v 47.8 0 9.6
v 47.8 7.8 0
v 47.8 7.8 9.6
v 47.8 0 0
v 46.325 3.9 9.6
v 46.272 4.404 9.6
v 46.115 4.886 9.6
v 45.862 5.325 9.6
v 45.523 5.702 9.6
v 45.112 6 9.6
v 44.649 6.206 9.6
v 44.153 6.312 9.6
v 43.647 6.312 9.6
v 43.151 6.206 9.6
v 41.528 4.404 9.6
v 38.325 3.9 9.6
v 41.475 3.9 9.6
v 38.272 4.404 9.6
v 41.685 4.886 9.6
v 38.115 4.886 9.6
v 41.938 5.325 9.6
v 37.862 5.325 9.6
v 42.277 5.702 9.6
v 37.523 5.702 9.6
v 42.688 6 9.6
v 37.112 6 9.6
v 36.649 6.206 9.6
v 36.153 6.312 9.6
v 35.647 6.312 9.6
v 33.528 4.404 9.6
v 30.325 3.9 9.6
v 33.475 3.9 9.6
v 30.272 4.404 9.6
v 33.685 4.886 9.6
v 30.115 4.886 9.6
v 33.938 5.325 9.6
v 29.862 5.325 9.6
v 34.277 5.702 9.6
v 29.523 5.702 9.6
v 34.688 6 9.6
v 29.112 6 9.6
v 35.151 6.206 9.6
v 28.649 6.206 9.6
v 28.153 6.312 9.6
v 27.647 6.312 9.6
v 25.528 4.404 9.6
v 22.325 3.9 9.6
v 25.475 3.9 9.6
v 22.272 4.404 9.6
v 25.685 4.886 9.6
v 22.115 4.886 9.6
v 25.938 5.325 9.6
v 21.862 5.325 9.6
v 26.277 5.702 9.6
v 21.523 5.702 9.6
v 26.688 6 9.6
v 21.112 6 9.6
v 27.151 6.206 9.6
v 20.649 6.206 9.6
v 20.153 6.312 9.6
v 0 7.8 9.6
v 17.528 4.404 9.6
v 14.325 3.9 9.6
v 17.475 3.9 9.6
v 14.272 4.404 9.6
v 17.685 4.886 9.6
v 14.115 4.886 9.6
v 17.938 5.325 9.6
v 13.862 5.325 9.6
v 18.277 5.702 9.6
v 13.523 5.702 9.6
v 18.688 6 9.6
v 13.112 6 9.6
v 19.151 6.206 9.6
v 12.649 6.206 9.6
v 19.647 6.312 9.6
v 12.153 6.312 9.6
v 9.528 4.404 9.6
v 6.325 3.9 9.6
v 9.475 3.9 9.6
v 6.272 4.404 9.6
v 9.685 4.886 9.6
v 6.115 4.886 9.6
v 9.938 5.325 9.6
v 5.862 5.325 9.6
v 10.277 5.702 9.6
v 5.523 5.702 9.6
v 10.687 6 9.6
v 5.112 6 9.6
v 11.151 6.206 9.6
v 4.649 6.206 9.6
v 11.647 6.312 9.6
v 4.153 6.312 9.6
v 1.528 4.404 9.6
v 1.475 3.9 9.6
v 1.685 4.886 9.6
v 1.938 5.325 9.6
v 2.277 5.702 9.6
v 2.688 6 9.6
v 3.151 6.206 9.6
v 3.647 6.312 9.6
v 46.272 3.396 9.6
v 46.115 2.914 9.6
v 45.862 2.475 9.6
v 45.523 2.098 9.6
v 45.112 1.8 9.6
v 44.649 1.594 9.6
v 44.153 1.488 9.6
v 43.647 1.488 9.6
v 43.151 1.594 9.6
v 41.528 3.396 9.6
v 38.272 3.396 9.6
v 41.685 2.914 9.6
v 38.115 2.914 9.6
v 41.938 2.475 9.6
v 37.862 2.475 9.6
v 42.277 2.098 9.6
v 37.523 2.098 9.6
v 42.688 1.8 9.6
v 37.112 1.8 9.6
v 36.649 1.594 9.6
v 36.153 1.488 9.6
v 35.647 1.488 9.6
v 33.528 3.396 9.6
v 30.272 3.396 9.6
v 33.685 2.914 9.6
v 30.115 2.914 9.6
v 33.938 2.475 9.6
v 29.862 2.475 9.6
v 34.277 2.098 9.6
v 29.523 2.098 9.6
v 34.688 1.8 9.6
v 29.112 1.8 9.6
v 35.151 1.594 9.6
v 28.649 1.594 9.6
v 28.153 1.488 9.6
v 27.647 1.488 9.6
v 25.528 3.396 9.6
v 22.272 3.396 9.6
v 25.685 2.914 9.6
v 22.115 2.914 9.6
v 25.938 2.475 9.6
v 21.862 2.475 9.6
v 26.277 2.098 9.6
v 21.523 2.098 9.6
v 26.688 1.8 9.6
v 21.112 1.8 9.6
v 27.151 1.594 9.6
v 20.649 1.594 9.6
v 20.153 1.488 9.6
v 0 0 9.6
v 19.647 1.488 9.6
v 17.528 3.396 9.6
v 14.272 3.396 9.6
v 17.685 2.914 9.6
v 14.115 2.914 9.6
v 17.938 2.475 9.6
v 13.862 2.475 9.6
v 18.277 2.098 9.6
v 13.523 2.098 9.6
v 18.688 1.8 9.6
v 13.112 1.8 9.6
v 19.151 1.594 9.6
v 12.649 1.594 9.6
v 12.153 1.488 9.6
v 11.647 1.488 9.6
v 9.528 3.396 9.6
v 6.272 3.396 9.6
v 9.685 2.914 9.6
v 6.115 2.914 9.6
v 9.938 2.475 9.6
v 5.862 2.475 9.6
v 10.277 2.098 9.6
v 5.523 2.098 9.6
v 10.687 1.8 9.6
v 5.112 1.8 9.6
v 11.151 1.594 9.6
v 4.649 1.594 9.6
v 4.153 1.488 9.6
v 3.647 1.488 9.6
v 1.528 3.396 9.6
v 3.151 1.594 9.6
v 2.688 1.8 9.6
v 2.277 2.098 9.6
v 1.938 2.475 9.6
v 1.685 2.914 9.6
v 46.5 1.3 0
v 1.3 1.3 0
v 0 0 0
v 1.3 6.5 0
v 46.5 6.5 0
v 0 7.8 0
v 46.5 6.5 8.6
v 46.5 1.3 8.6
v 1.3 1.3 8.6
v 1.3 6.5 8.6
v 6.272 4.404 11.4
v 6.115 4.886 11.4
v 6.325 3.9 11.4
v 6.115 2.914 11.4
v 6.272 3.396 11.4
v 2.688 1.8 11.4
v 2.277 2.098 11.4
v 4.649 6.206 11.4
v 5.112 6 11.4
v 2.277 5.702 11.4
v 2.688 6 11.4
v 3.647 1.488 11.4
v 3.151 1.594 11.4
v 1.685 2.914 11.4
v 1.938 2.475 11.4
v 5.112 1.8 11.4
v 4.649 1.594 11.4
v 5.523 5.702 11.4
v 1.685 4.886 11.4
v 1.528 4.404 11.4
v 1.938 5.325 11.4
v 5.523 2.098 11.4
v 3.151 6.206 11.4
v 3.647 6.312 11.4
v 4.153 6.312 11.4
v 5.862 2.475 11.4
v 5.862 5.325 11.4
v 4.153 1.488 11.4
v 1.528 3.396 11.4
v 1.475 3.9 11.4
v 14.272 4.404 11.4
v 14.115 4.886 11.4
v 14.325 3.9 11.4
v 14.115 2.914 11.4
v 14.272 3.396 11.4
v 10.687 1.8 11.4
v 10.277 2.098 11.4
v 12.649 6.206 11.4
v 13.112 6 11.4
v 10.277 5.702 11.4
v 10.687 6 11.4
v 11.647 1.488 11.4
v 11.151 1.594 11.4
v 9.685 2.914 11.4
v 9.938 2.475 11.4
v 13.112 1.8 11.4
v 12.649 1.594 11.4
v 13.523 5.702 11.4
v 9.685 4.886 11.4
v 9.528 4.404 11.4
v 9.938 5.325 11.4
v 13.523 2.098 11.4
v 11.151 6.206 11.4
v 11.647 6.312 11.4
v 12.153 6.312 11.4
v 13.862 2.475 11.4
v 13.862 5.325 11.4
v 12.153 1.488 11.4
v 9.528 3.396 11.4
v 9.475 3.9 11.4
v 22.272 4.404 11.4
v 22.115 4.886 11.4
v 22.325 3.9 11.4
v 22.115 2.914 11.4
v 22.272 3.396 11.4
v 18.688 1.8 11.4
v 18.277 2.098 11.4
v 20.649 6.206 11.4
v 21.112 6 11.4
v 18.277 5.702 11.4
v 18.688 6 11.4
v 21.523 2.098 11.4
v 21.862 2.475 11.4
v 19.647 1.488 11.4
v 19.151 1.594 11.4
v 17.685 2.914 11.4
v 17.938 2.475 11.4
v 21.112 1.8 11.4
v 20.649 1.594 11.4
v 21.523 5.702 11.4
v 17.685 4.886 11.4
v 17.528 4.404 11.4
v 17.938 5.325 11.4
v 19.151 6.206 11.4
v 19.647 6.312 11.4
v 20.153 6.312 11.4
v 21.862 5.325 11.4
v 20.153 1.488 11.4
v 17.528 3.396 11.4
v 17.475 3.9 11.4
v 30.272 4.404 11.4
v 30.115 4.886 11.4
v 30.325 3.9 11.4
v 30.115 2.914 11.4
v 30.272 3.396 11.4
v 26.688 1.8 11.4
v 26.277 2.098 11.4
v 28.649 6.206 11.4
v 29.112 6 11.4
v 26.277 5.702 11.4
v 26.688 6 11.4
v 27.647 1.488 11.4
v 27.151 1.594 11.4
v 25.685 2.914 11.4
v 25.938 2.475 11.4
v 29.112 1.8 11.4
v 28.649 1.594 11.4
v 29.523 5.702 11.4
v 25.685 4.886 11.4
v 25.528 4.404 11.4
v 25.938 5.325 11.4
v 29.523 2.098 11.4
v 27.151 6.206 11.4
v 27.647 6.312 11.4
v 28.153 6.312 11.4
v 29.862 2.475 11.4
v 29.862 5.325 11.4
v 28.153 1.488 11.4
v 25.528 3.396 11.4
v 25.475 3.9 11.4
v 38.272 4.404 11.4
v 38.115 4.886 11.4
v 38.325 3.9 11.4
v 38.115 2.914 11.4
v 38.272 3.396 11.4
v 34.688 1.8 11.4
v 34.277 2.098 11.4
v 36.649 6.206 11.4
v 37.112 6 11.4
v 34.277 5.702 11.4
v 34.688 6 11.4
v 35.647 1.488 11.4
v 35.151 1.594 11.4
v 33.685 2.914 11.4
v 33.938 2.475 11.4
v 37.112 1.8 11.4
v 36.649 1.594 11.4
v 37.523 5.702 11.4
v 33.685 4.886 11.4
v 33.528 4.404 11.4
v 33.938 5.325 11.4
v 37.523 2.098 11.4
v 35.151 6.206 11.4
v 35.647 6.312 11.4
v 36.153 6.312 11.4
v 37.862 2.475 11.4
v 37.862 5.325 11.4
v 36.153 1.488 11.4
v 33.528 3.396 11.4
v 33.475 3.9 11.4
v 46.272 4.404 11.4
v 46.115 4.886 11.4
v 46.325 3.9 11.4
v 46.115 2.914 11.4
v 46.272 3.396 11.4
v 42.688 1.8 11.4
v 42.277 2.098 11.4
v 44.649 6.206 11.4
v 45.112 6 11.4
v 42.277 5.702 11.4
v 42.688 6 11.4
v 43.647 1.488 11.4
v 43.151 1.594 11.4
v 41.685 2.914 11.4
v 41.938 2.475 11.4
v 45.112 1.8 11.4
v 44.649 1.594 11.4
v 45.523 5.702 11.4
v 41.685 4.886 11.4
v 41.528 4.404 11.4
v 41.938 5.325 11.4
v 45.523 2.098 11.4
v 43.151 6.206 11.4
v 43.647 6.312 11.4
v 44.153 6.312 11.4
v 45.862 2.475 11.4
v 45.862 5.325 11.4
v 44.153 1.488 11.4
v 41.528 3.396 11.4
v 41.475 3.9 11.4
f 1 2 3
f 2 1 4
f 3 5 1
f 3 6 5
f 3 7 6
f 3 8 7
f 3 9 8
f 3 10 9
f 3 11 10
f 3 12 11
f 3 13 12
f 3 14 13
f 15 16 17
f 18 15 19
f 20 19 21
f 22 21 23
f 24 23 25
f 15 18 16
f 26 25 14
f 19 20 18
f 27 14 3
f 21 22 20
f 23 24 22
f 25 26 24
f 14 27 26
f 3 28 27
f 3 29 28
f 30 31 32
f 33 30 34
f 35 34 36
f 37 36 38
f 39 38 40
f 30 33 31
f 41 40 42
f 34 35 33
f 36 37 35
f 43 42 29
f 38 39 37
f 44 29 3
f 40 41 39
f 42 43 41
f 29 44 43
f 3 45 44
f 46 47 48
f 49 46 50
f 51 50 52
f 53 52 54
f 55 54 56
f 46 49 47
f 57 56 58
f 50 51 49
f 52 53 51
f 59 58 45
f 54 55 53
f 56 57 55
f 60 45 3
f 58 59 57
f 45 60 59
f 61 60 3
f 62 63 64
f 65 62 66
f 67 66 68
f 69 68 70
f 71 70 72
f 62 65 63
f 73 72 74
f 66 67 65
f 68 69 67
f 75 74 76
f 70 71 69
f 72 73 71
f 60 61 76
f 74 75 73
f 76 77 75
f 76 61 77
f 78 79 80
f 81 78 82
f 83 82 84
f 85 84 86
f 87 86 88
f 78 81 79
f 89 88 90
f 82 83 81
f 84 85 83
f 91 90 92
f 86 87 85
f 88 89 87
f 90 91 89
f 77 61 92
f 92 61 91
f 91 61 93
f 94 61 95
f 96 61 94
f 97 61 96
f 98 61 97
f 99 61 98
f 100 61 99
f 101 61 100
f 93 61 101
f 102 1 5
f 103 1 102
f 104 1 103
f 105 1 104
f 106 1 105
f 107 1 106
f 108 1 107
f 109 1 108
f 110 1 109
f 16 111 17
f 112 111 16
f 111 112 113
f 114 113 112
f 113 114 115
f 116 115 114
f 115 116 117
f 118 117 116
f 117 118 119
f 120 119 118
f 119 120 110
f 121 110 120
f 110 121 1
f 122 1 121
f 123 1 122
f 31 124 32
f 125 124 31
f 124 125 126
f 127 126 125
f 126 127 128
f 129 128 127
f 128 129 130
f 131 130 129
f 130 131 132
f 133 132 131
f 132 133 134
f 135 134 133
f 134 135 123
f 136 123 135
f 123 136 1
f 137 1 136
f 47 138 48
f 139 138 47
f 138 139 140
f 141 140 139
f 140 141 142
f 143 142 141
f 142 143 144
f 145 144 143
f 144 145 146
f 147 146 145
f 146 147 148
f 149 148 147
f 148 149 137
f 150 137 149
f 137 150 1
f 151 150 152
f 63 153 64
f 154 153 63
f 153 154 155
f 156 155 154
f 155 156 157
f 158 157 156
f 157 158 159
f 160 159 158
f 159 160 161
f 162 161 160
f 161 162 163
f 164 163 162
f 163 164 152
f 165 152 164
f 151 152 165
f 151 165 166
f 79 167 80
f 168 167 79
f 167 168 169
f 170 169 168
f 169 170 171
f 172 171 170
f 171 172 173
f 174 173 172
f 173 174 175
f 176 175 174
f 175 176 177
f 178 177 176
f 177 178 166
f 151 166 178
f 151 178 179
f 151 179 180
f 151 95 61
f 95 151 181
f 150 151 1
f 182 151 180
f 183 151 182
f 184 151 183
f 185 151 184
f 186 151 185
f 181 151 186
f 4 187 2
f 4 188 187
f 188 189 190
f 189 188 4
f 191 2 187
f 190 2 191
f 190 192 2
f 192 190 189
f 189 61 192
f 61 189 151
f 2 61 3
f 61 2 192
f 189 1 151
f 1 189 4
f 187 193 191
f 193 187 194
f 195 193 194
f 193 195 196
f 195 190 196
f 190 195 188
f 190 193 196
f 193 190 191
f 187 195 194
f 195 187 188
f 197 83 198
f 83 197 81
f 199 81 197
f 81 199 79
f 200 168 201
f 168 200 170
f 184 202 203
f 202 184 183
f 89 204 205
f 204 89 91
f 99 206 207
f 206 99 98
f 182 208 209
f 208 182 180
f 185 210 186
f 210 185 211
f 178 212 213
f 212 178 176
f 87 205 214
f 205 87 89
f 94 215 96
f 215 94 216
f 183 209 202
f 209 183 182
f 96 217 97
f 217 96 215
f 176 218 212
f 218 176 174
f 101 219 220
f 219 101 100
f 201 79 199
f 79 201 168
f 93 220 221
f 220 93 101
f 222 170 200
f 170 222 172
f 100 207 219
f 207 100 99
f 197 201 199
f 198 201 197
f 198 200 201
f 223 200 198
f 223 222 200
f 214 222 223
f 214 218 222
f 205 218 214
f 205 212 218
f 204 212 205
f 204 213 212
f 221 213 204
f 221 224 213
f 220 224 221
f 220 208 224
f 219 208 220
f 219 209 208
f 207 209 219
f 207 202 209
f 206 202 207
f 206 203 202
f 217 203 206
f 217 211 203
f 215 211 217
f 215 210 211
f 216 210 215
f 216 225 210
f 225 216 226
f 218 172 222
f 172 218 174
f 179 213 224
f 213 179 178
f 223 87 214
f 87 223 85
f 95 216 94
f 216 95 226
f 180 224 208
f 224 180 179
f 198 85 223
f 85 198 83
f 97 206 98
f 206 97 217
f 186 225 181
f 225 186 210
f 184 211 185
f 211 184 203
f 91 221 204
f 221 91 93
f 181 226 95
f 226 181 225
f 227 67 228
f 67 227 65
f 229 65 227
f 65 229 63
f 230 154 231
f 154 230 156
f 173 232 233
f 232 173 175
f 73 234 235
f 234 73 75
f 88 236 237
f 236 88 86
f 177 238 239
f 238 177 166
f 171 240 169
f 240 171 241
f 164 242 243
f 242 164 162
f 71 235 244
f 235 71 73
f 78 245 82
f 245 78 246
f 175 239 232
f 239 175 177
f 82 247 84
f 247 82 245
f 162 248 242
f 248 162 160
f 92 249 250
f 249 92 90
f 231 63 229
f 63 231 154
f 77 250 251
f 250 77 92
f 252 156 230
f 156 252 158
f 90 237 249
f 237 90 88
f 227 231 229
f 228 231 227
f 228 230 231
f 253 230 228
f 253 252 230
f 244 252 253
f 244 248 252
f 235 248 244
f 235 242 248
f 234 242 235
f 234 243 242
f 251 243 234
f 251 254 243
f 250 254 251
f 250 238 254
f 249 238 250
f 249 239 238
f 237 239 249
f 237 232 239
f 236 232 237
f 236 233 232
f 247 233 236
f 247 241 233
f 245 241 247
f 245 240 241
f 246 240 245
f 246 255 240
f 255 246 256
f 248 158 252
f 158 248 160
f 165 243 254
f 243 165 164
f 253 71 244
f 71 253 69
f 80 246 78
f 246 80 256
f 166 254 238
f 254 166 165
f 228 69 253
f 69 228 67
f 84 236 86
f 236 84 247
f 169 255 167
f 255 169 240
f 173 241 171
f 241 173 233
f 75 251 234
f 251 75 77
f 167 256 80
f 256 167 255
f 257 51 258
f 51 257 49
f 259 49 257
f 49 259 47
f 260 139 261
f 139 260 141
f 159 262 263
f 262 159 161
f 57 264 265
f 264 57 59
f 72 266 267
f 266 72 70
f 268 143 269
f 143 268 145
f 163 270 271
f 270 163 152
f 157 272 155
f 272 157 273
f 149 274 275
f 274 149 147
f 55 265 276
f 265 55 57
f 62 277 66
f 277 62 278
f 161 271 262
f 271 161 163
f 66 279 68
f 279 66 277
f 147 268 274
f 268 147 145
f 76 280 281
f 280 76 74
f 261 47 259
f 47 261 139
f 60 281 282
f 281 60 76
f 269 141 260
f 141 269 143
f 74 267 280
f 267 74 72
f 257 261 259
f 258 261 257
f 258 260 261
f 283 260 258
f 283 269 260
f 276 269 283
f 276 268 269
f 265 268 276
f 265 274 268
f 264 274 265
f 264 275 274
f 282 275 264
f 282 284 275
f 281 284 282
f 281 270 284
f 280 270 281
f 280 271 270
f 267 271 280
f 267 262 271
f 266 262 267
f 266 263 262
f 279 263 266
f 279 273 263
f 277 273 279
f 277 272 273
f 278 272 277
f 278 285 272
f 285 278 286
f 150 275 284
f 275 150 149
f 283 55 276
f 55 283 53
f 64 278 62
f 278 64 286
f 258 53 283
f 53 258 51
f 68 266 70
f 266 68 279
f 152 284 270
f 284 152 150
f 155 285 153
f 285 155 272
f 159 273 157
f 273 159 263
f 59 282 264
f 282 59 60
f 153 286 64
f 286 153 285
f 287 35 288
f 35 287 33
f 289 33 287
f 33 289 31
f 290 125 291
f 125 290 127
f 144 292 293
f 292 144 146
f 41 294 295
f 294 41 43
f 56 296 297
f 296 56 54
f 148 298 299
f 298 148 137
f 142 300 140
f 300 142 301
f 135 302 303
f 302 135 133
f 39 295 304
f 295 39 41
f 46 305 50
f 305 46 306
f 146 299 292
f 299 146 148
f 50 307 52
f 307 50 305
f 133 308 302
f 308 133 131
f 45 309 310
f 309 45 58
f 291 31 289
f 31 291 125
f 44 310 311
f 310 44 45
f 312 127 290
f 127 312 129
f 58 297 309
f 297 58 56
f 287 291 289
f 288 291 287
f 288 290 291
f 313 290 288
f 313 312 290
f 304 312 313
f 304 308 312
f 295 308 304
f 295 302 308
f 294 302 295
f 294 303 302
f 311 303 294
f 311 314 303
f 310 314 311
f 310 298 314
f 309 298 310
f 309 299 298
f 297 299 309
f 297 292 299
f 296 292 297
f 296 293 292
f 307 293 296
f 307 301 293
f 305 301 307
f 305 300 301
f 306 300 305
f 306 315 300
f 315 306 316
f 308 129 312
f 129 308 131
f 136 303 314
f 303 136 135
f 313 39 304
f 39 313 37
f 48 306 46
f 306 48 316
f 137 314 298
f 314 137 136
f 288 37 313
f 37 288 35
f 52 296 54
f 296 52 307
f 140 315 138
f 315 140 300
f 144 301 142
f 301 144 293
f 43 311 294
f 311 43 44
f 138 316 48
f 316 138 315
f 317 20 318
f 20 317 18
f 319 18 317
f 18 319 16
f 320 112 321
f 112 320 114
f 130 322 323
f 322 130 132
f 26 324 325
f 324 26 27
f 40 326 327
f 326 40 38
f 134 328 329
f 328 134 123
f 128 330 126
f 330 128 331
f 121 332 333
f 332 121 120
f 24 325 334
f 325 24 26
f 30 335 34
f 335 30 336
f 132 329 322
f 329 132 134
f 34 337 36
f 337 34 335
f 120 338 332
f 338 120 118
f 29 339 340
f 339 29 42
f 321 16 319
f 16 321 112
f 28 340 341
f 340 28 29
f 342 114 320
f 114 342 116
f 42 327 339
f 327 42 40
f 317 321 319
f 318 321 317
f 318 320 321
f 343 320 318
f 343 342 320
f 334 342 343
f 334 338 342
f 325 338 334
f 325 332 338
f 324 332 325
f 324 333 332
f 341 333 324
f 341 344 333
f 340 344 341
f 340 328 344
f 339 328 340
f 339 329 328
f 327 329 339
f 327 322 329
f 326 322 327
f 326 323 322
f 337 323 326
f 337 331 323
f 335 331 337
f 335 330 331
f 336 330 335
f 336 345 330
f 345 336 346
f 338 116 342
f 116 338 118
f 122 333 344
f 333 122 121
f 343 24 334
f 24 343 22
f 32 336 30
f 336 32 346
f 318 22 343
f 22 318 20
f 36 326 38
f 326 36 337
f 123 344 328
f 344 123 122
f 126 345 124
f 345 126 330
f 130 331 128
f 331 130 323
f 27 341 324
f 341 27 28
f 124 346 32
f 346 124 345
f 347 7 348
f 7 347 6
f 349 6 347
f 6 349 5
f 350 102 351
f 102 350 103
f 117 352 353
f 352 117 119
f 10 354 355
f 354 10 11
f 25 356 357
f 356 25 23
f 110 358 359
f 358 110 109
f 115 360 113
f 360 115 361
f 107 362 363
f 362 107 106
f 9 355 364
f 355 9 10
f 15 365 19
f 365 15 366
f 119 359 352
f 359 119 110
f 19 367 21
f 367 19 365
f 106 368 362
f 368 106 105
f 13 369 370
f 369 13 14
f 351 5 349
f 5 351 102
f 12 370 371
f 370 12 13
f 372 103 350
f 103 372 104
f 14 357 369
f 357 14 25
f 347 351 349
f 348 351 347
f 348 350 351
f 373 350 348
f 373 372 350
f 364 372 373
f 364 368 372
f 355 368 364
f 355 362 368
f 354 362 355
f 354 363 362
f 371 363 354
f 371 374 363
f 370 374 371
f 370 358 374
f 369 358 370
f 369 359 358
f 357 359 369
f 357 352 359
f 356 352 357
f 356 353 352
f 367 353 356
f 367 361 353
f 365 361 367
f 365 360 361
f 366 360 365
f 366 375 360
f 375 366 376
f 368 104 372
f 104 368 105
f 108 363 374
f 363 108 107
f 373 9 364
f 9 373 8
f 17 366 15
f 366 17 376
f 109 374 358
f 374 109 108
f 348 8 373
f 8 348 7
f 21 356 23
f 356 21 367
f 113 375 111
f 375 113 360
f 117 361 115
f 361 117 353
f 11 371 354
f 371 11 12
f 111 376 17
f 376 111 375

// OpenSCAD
/**
 * Derived from http://www.thingiverse.com/thing:5699
 *
 * LEGO®, the LEGO® logo, the Brick, DUPLO®, and MINDSTORMS® are trademarks of the LEGO® Group. ©2012 The LEGO® Group.
 */
 
 /**
  * For clip and block, i've :
  * remove Pin diameter (pin_diameter = 0)
  * spline_thickness (spline_thickness=0)
  */

/* [General] */

// Width of the block, in studs
block_width = 1;

// Length of the block, in studs
block_length = 6;

// Height of the block. A ratio of "1" is a standard LEGO brick height; a ratio of "1/3" is a standard LEGO plate height; "1/2" is a standard DUPLO plate.
block_height_ratio = 1; // [.33333333333:1/3, .5:1/2, 1:1, 2:2, 3:3, 4:4, 5:5, 6:6, 7:7, 8:8, 9:9, 10:10]

// What type of block should this be? For type-specific options, see the "Wings," "Slopes," "Curves", and "Baseplates" tabs.
block_type = "brick"; // [brick:Brick, tile:Tile, wing:Wing, slope:Slope, curve:Curve, baseplate:Baseplate]

// What brand of block should this be? LEGO for regular LEGO bricks, Duplo for the toddler-focused larger bricks.
block_brand = "lego"; // [lego:LEGO, duplo:DUPLO]

// What stud type do you want? Hollow studs allow rods to be pushed into the stud.
stud_type = "solid"; // [solid:Solid, hollow:Hollow]

// Should the block include round horizontal holes like the Technics LEGO bricks have?
technic_holes = "no"; // [no:No, yes:Yes]

// Should the block include vertical cross-shaped axle holes?
vertical_axle_holes = "no"; // [no:No, yes:Yes]

/* [Wings] */

// What type of wing? Full is suitable for the front of a plane, left/right are for the left/right of a plane.
wing_type = "full"; // [full:Full, left:Left, right:Right]

// The number of studs across the end of the wing. If block_width is odd, this needs to be odd, and the same for even.
wing_end_width = 2;

// The length of the rectangular portion of the wing, in studs.
wing_base_length = 3;

// Should the wing edges be notched to accept studs below?
wing_stud_notches = "yes"; // [yes:Yes, no:No]

/* [Slopes] */

// How many rows of studs should be left before the slope?
slope_stud_rows = 1;

// How much vertical height should be left at the end of the slope? e.g, a value of zero means the slope reaches the bottom of the block. A value of 1 means that for a block with height 2, the slope reaches halfway down the block.
slope_end_height = 0;

/* [Curves] */

// How many rows of studs should be left before the curve?
curve_stud_rows = 5;

// Should the curve be convex or concave?
curve_type = "concave"; // [concave:Concave, convex:Convex]

// How much vertical height should be left at the end of the curve? e.g, a value of zero means the curve reaches the bottom of the block. A value of 1 means that for a block with height 2, the curve reaches halfway down the block.
curve_end_height = 0;

/* [Baseplates] */

// If you want a roadway, how wide should it be (in studs)? A roadway is a smooth (non-studded) section of a baseplate.
roadway_width = 0;

// How long should the roadway be?
roadway_length = 0;

// Where should the roadway start (x-value)? A value of zero puts the roadway at the far left side of the plate.
roadway_x = 0;

// Where should the roadway start (y-value)? A value of zero puts the roadway at the front of the plate.
roadway_y = 0;

/* [SNOT] */

// SNOT means Studs Not On Top -- bricks with alternative stud configurations.
// Put studs on the top and buttom?
dual_sided = "no"; // [no:No, yes:Yes]

// Instead of both sides having studs, both sides can have no studs.
dual_bottom = "no"; // [no:No, yes:Yes]

/* [Printer-Specific] */

// Should extra reinforcement be included to make printing on an FDM printer easier? Ignored for tiles, since they're printed upside-down and don't need the reinforcement. Recommended for block heights less than 1 or for Duplo bricks. 
use_reinforcement = "no"; // [no:No, yes:Yes]

// If your printer prints the blocks correctly except for the stud diameter, use this variable to resize just the studs for your printer. A value of 1.05 will print the studs 105% wider than standard.
stud_rescale = 1;
//stud_rescale = 1.0475 * 1; // Orion Delta, T-Glase
//stud_rescale = 1.022 * 1; // Orion Delta, ABS

// Print tiles upside down.
translate([0, 0, (block_type == "tile" ? block_height_ratio * block_height : 0)]) rotate([0, (block_type == "tile" ? 180 : 0), 0]) {
    block(
        width=block_width,
        length=block_length,
        height=block_height_ratio,
        type=block_type,
        brand=block_brand,
        stud_type=stud_type,
        horizontal_holes=(technic_holes=="yes"),
        vertical_axle_holes=(vertical_axle_holes=="yes"),
        reinforcement=(use_reinforcement=="yes"),
        wing_type=wing_type,
        wing_end_width=wing_end_width,
        wing_base_length=wing_base_length,
        stud_notches=(wing_stud_notches=="yes"),
        slope_stud_rows=slope_stud_rows,
        slope_end_height=slope_end_height,
        curve_stud_rows=curve_stud_rows,
        curve_type=curve_type,
        curve_end_height=curve_end_height,
        roadway_width=roadway_width,
        roadway_length=roadway_length,
        roadway_x=roadway_x,
        roadway_y=roadway_y,
        stud_rescale=stud_rescale,
        dual_sided=(dual_sided=="yes"),
        dual_bottom=(dual_bottom=="yes")
    );
}

module block(
    width=1,
    length=2,
    height=1,
    type="brick",
    brand="lego",
    stud_type="solid",
    horizontal_holes=false,
    vertical_axle_holes=false,
    reinforcement=false,
    wing_type="full",
    wing_end_width=2,
    wing_base_length=2,
    stud_notches=false,
    slope_stud_rows=1,
    slope_end_height=0,
    curve_stud_rows=1,
    curve_type="concave",
    curve_end_height=0,
    roadway_width=0,
    roadway_length=0,
    roadway_x=0,
    roadway_y=0,
    stud_rescale=1,
    dual_sided=false,
    dual_bottom=false
    ) {
    post_wall_thickness = (brand == "lego" ? 0.85 : 1);
    wall_thickness=(brand == "lego" ? 1.3 : 1.5);
    stud_diameter=(brand == "lego" ? 4.85 : 9.35);
    hollow_stud_inner_diameter = (brand == "lego" ? 3.1 : 6.7);
    stud_height=(brand == "lego" ? 1.8 : 4.4);
    stud_spacing=(brand == "lego" ? 8 : 8 * 2);
    block_height=(brand == "lego" ? (type == "baseplate" ? 1.3 : 9.6) : 9.6 * 2);
    pin_diameter=(brand == "lego" ? 0 : 3 * 2);
    post_diameter=(brand == "lego" ? 5.5 : 13.2);
    cylinder_precision=(brand == "lego" ? 0.1 : 0.05);
    reinforcing_width = (brand == "lego" ? 0.7 : 1);

    spline_length = (brand == "lego" ? 0.25 : 1.7);
    spline_thickness = (brand == "lego" ? 0 : 1.3);

    horizontal_hole_diameter = (brand == "lego" ? 4.8 : 4.8 * 2);
    horizontal_hole_z_offset = (brand == "lego" ? 5.8 : 5.8 * 2);
    horizontal_hole_bevel_diameter = (brand == "lego" ? 6.2 : 6.2 * 2);
    horizontal_hole_bevel_depth = (brand == "lego" ? 0.9 : 0.9 * 1.5 / 1.2 );

    roof_thickness = (type == "baseplate" || dual_sided ? block_height * height : 1 * 1);

    // Brand-independent measurements.
    axle_spline_width = 2.0;
    axle_diameter = 5 * 1;
    wall_play = 0.1 * 1;
    horizontal_hole_wall_thickness = 1 * 1;

    // Ensure that width is always less than or equal to length.
    real_width = (type == "wing" ? width : min(width, length) );
    real_length = (type == "wing" ? length : max(width, length) );
    real_height = max((type == "baseplate" ? 1 : 1/3), height);

    // Ensure that the wing end width is even if the width is even, odd if odd, and a reasonable value.
    real_wing_end_width = (wing_type == "full"
        ?
        min(real_width - 2, ((real_width % 2 == 0) ? 
            (max(2, (
                wing_end_width % 2 == 0 ?
                (wing_end_width)
                :
                (wing_end_width-1)
            )))
            :
            (max(1, (
                wing_end_width % 2 == 0 ?
                (wing_end_width-1)
                :
                (wing_end_width)
            )))
        ))
        :
        (min(real_width-1, max(1, wing_end_width))) // Half-wing
    );

    // Ensure that the base length is a reasonable value.
    real_wing_base_length = min(real_length-1, max(1, wing_base_length)) + 1; // +1 because the angle starts before the last stud.
        
    // Validate all the rest of the arguments.
    real_slope_end_height = max(0, min(real_height - 1/3, slope_end_height));
    real_slope_stud_rows = min(real_length - 1, slope_stud_rows);
    real_curve_stud_rows = max(0, curve_stud_rows);
    real_curve_type = (curve_type == "convex" ? "convex" : "concave");
    real_curve_end_height = max(0, min(real_height - 1/3, curve_end_height));
    real_horizontal_holes = horizontal_holes && ((type == "baseplate" && real_height >= 8) || real_height >= 1) && !dual_sided;
    real_vertical_axle_holes = vertical_axle_holes && real_width > 1;
    real_reinforcement = reinforcement && type != "baseplate" && type != "tile" && !dual_sided;

    real_roadway_width = max(0, min(roadway_width, real_width));
    real_roadway_length = max(0, min(roadway_length, real_length));
    real_roadway_x = max(0, min(real_length - real_roadway_length, roadway_x));
    real_roadway_y = max(0, min(real_width - real_roadway_width, roadway_y));

    real_stud_notches = stud_notches && !dual_sided;
    real_dual_sided = dual_sided && type != "curve" && type != "slope" && type != "tile";
    real_dual_bottom = dual_bottom && !real_dual_sided && type != "curve" && type != "slope";

    total_studs_width = (stud_diameter * stud_rescale * real_width) + ((real_width - 1) * (stud_spacing - (stud_diameter * stud_rescale)));
    total_studs_length = (stud_diameter * stud_rescale * real_length) + ((real_length - 1) * (stud_spacing - (stud_diameter * stud_rescale)));

    total_posts_width = (post_diameter * (real_width - 1)) + ((real_width - 2) * (stud_spacing - post_diameter));
    total_posts_length = (post_diameter * (real_length - 1)) + ((real_length - 2) * (stud_spacing - post_diameter));

    total_axles_width = (axle_diameter * (real_width - 1)) + ((real_width - 2) * (stud_spacing - axle_diameter));
    total_axles_length = (axle_diameter * (real_length - 1)) + ((real_length - 2) * (stud_spacing - axle_diameter));

    total_pins_width = (pin_diameter * (real_width - 1)) + max(0, ((real_width - 2) * (stud_spacing - pin_diameter)));
    total_pins_length = (pin_diameter * (real_length - 1)) + max(0, ((real_length - 2) * (stud_spacing - pin_diameter)));

    overall_length = (real_length * stud_spacing) - (2 * wall_play);
    overall_width = (real_width * stud_spacing) - (2 * wall_play);

    wing_slope = (wing_type == "full" ?
        ((real_width - (real_wing_end_width + 1)) / 2) / (real_length - (real_wing_base_length - 1))
        :
        (real_width - (real_wing_end_width)) / (real_length - (real_wing_base_length - 1))
    );

   translate([0,0, 0]) // Comment to position at 0,0,0 instead of centered on X and Y.
        union() {
            difference() {
                union() {
                    /**
                     * Include any union()s that should come before the final difference()s.
                     */
                    
                    // The mass of the block.
                    difference() {
                        cube([overall_length, overall_width, real_height * block_height]);
                        translate([wall_thickness,wall_thickness,-roof_thickness]) cube([overall_length-wall_thickness*2,overall_width-wall_thickness*2,block_height*real_height]);
                    }

                    // The studs on top of the block (if it's not a tile).
                    if ( type != "tile" && !real_dual_bottom ) {
                        translate([stud_diameter * stud_rescale / 2, stud_diameter * stud_rescale / 2, 0]) 
                        translate([(overall_length - total_studs_length)/2, (overall_width - total_studs_width)/2, 0]) {
                            for (ycount=[0:real_width-1]) {
                                for (xcount=[0:real_length-1]) {
                                    if (!skip_this_stud(xcount, ycount)) {
                                        translate([xcount*stud_spacing,ycount*stud_spacing,block_height*real_height]) stud();
                                    }
                                }
                            }
                       }
                    }

                    // Interior splines to catch the studs.
                    translate([stud_spacing / 2 - wall_play - (spline_thickness/2), 0, 0]) for (xcount = [0:real_length-1]) {
                        translate([0,wall_thickness,0]) translate([xcount * stud_spacing, 0, 0]) cube([spline_thickness, spline_length, real_height * block_height]);
                        translate([xcount * stud_spacing, overall_width - wall_thickness -  spline_length, 0]) cube([spline_thickness, spline_length, real_height * block_height]);
                    }

                    translate([0, stud_spacing / 2 - wall_play - (spline_thickness/2), 0]) for (ycount = [0:real_width-1]) {
                        translate([wall_thickness,0,0]) translate([0, ycount * stud_spacing, 0]) cube([spline_length, spline_thickness, real_height * block_height]);
                        translate([overall_length - wall_thickness -  spline_length, ycount * stud_spacing, 0]) cube([spline_length, spline_thickness, real_height * block_height]);
                    }

                    if (type != "baseplate" && real_width > 1 && real_length > 1 && !real_dual_sided && roof_thickness < block_height * height) {
                        // Reinforcements and posts
                        translate([post_diameter / 2, post_diameter / 2, 0]) {
                            translate([(overall_length - total_posts_length)/2, (overall_width - total_posts_width)/2, 0]) {
                                union() {
                                    // Posts
                                    for (ycount=[1:real_width-1]) {
                                        for (xcount=[1:real_length-1]) {
                                            translate([(xcount-1)*stud_spacing,(ycount-1)*stud_spacing,0]) post(real_vertical_axle_holes && !skip_this_vertical_axle_hole(xcount, ycount));
                                        }
                                    }

                                    // Reinforcements
                                    if (real_reinforcement) {
                                        difference() {
                                            for (ycount=[1:real_width-1]) {
                                                for (xcount=[1:real_length-1]) {
                                                    translate([(xcount-1)*stud_spacing,(ycount-1)*stud_spacing,0]) reinforcement();
                                                }
                                            }

                                            for (ycount=[1:real_width-1]) {
                                                for (xcount=[1:real_length-1]) {
                                                    translate([(xcount-1)*stud_spacing,(ycount-1)*stud_spacing,-0.5]) cylinder(r=post_diameter/2-0.1, h=real_height*block_height+0.5, $fs=cylinder_precision);
                                                }
                                            }
                                        }
                                    }
                                }
                            }
                        }
                    }

                    if (type != "baseplate" && (real_width == 1 || real_length == 1) && real_width != real_length && !real_dual_sided && roof_thickness < block_height * height) {
                        // Pins
                        if (real_width == 1) {
                            translate([(pin_diameter/2) + (overall_length - total_pins_length) / 2, overall_width/2, 0]) {
                                for (xcount=[1:real_length-1]) {
                                    translate([(xcount-1)*stud_spacing,0,0]) cylinder(r=pin_diameter/2,h=block_height*real_height,$fs=cylinder_precision);
                                }
                            }
                        }
                        else {
                            translate([overall_length/2, (pin_diameter/2) + (overall_width - total_pins_width) / 2, 0]) {
                                for (ycount=[1:real_width-1]) {
                                    translate([0,(ycount-1)*stud_spacing,0]) cylinder(r=pin_diameter/2,h=block_height*real_height,$fs=cylinder_precision);
                                }
                            }
                        }
                    }

                    if (real_horizontal_holes) {
                        // The holes for the horizontal axles.
                        // 1-length bricks have the hole underneath the stud.
                        // >1-length bricks have the holes between the studs.
                        for (height_index = [0 : height - 1]) {
                            translate([horizontal_holes_x_offset(), overall_width, height_index * block_height]) 
                            translate([(overall_length - total_studs_length)/2, 0, 0]) {
                            for (axle_hole_index=[horizontal_hole_start_index() : horizontal_hole_end_index()]) {
                                if (!skip_this_horizontal_hole(axle_hole_index, height_index)) {
                                        translate([axle_hole_index*stud_spacing,0,horizontal_hole_z_offset]) rotate([90, 0, 0])  cylinder(r=horizontal_hole_diameter/2 + horizontal_hole_wall_thickness, h=overall_width,$fs=cylinder_precision);
                                    }
                                }
                            }
                        }
                    }
                }

                
                /**
                 * Include any differences from the basic brick here.
                 */
                
                if (real_vertical_axle_holes) {
                    if (real_width > 1 && real_length > 1) {
                        translate([axle_diameter / 2, axle_diameter / 2, 0]) {
                            translate([(overall_length - total_axles_length)/2, (overall_width - total_axles_width)/2, 0]) {
                                for (ycount = [ 1 : real_width - 1 ]) {
                                    for (xcount = [ 1 : real_length - 1]) {
                                        if (!skip_this_vertical_axle_hole(xcount, ycount)) {
                                            translate([(xcount-1)*stud_spacing,(ycount-1)*stud_spacing,-block_height/2]) axle();
                                        }
                                    }
                                }
                            }
                        }
                    }
                }

                if (type == "wing") {
                    if (wing_type == "full" || wing_type == "right")  {
                        translate([0, 0, -0.5]) linear_extrude(block_height * real_height + stud_height + 1) polygon(points=[
                            [stud_spacing * (real_wing_base_length-1), -0.01],
                            [overall_length + 0.01, -0.01],
                            [overall_length + 0.01, (wing_type == "full" ?
                                (overall_width / 2 - (real_wing_end_width * stud_spacing / 2))
                                :
                                (overall_width - (real_wing_end_width * stud_spacing))
                            )]
                        ]
                        );
                    }
                    if (wing_type == "full" || wing_type == "left")  {
                        translate([0, 0, -0.5]) linear_extrude(block_height * real_height + stud_height + 1) polygon(points=[
                            [stud_spacing * (real_wing_base_length-1), overall_width + 0.01],
                            [overall_length + 0.01, overall_width + 0.01],
                            [overall_length + 0.01, (wing_type == "full" ? overall_width / 2 : 0) + (real_wing_end_width * stud_spacing / (wing_type == "full" ? 2 : 1))]
                        ]
                        );


                    }
                }
                else if (type == "slope") {
                    translate([0, overall_width+0.5, 0]) rotate([90, 0, 0]) linear_extrude(overall_width+1) polygon(points=[
                        [-0.1, (block_height * real_slope_end_height) + stud_height],
                        [min(overall_length, overall_length - (stud_spacing * real_slope_stud_rows) + (wall_play/2)), real_height * block_height - roof_thickness],
                        [min(overall_length, overall_length - (stud_spacing * real_slope_stud_rows) + (wall_play/2)), real_height * block_height + stud_height + 1],
                        [-0.1, real_height * block_height + stud_height + 1]
                    ]);
                }
                else if (type == "curve") {
                    if (real_curve_type == "concave") {
                                            echo(curve_circle_height());
                        difference() {
                            translate([
                                    -curve_circle_length() / 2, // Align the center of the cube with the end of the block.
                                    -0.5, // Center the extra width on the block.
                                    (real_height * block_height) - (curve_circle_height() / 2)  // Align the bottom of the cube with the center of the curve circle.
                                ])
                                cube([curve_circle_length(), overall_width + 1, curve_circle_height()]);

                            translate([
                                    curve_circle_length() / 2,  // Align the end of the curve with the end of the block.
                                    overall_width / 2, // Center it on the block.
                                    (real_height * block_height) - (curve_circle_height() / 2)  // Align the top of the curve with the top of the block.
                                ])
                                rotate([90, 0, 0]) // Rotate sideways
                                translate([0, 0, -overall_width/2]) // Move so the cylinder is z-centered.
                                resize([curve_circle_length(), curve_circle_height(), 0]) // Resize to the approprate scale.
                                cylinder(r=real_height * block_height, h=overall_width, $fs=cylinder_precision);
                        }
                    }
                    else if (real_curve_type == "convex") {
                        union() {
                            translate([0, 0, real_height * block_height]) cube([overall_length - (real_curve_stud_rows * stud_spacing), overall_width, stud_height + .1]);
                            translate([0, 0, block_height * real_height])
                                translate([0, (overall_width+1)/2-.5, 0]) // Center across the end of the block.
                                rotate([90, 0, 0])
                                translate([0, 0, -((overall_width+1)/2)]) // z-center
                                resize([curve_circle_length(), curve_circle_height(), 0]) // Resize to the final dimensions.
                                cylinder(r=block_height * real_height, h=overall_width+1, $fs=cylinder_precision);
                        }
                    }
                }
                else if (type == "baseplate") {
                    // Rounded corners.
                    union() {
                        translate([overall_length, overall_width, 0]) translate([-((stud_spacing / 2) - wall_play), -((stud_spacing / 2) - wall_play), 0]) negative_rounded_corner(r=((stud_spacing / 2) - wall_play), h=real_height * block_height);
                        
                        translate([0, overall_width, 0]) translate([((stud_spacing / 2) - wall_play), -((stud_spacing / 2) - wall_play), 0]) rotate([0, 0, 90]) negative_rounded_corner(r=((stud_spacing / 2) - wall_play), h=real_height * block_height);
                        translate([((stud_spacing / 2) - wall_play), ((stud_spacing / 2) - wall_play), 0]) rotate([0, 0, 180]) negative_rounded_corner(r=((stud_spacing / 2) - wall_play), h=real_height * block_height);
                        translate([overall_length, 0, 0]) translate([-((stud_spacing / 2) - wall_play), ((stud_spacing / 2) - wall_play), 0]) rotate([0, 0, 270]) negative_rounded_corner(r=((stud_spacing / 2) - wall_play), h=real_height * block_height);
                    }
                }

                if (real_horizontal_holes) {
                    // The holes for the horizontal axles.
                    // 1-length bricks have the hole underneath the stud.
                    // >1-length bricks have the holes between the studs.
                    for (height_index = [0 : height - 1]) {
                        translate([horizontal_holes_x_offset(), 0, height_index * block_height]) 
                        translate([(overall_length - total_studs_length)/2, 0, 0]) {
                            for (axle_hole_index=[horizontal_hole_start_index() : horizontal_hole_end_index()]) {
                                if (!skip_this_horizontal_hole(axle_hole_index, height_index)) {
                                    union() {
                                        translate([axle_hole_index*stud_spacing,overall_width,horizontal_hole_z_offset]) rotate([90, 0, 0])  cylinder(r=horizontal_hole_diameter/2, h=overall_width,$fs=cylinder_precision);
    
                                        // Bevels. The +/- 0.1 measurements are here just for nicer previews in OpenSCAD, and could be removed.
                                        translate([axle_hole_index*stud_spacing,horizontal_hole_bevel_depth-0.1,horizontal_hole_z_offset]) rotate([90, 0, 0]) cylinder(r=horizontal_hole_bevel_diameter/2, h=horizontal_hole_bevel_depth+0.1,$fs=cylinder_precision);
                                        translate([axle_hole_index*stud_spacing,overall_width+0.1,horizontal_hole_z_offset]) rotate([90, 0, 0]) cylinder(r=horizontal_hole_bevel_diameter/2, h=horizontal_hole_bevel_depth+0.1,$fs=cylinder_precision);
                                    }
                                }
                            }
                        }
                    }
                }
            }

            
            /**
             * Any final union()s for the brick.
             */
            
            if (type == "wing") {
                difference() {
                    union() {
                        if ( wing_type == "full" || wing_type == "right" ){
                            linear_extrude(block_height * real_height) polygon(points=[
                                [stud_spacing * (real_wing_base_length-1), 0],
                                [overall_length, (wing_type == "full" ? 
                                    ((overall_width / 2) - (real_wing_end_width * stud_spacing / 2))
                                    :
                                    (overall_width - (real_wing_end_width * stud_spacing))
                                )],
                                [overall_length, (wing_type == "full" ? 
                                    ((overall_width / 2) - (real_wing_end_width * stud_spacing / 2))
                                    :
                                    (overall_width - (real_wing_end_width * stud_spacing))
                                ) + wall_thickness],
                                [stud_spacing * (real_wing_base_length-1), wall_thickness]
                            ]);
                        }

                        if (wing_type == "full" || wing_type == "left") {
                            linear_extrude(block_height * real_height) polygon(points=[
                                [stud_spacing * (real_wing_base_length-1), overall_width],
                                [overall_length, (wing_type == "full" ? overall_width / 2 : 0) + (real_wing_end_width * stud_spacing / (wing_type == "full" ? 2 : 1))],
                                [overall_length, (wing_type == "full" ? overall_width / 2 : 0) + (real_wing_end_width * stud_spacing / (wing_type == "full" ? 2 : 1)) - wall_thickness],
                                [stud_spacing * (real_wing_base_length-1), overall_width - wall_thickness]
                            ]);
                        }
                    }

                    if (real_stud_notches) {
                        translate([overall_length/2, overall_width/2, 0])
                            translate([0, 0, -(1/3 * block_height)]) block(
                                width=real_width,
                                length=real_length,
                                height=1/3,
                                brand=brand,
                                stud_type="solid",
                                type="brick",
                                stud_rescale=1.5
                            );
                    }
                }
            }
            else if (type == "slope") {
                translate([0, overall_width, 0]) rotate([90, 0, 0]) linear_extrude(overall_width) polygon(points=[
                    [0, (block_height * real_slope_end_height) + stud_height],
                    [0, (block_height * real_slope_end_height) + stud_height + roof_thickness],
                    [min(overall_length, overall_length - (stud_spacing * real_slope_stud_rows) + (wall_play/2)), real_height * block_height],
                    [min(overall_length, overall_length - (stud_spacing * real_slope_stud_rows) + (wall_play/2)), (real_height * block_height) - roof_thickness]
                ]);
            }
            else if (type == "curve") {
                if (real_curve_type == "concave") {
                    intersection() {
                        translate([
                                -curve_circle_length() / 2, // Align the center of the cube with the end of the block.
                                -0.5, // Center the extra width on the block.
                                (real_height * block_height) - (curve_circle_height() / 2)  // Align the bottom of the cube with the center of the curve circle.
                            ])
                            cube([curve_circle_length(), overall_width + 1, curve_circle_height()]);

                        difference() {   
                            translate([
                                    curve_circle_length() / 2,  // Align the end of the curve with the end of the block.
                                    overall_width / 2, // Center it on the block.
                                    (real_height * block_height) - (curve_circle_height() / 2)  // Align the top of the curve with the top of the block.
                                ])
                                rotate([90, 0, 0]) // Rotate sideways
                                translate([0, 0, -overall_width/2]) // Move so the cylinder is z-centered.
                                resize([curve_circle_length(), curve_circle_height(), 0]) // Resize to the approprate scale.
                                cylinder(r=real_height * block_height, h=overall_width, $fs=cylinder_precision);

                            translate([
                                    curve_circle_length() / 2,  // Align the end of the curve with the end of the block.
                                    overall_width / 2, // Center it on the block.
                                    (real_height * block_height) - (curve_circle_height() / 2) // Align the top of the curve with the top of the block.
                                ])
                                rotate([90, 0, 0]) // Rotate sideways
                                translate([0, 0, -overall_width/2]) // Move so the cylinder is z-centered.
                                resize([curve_circle_length() - (wall_thickness * 2), curve_circle_height() - (wall_thickness * 2), 0]) // Resize to the approprate scale.
                                cylinder(r=real_height * block_height, h=overall_width, $fs=cylinder_precision);
                        }
                    }
                }
                else if (real_curve_type == "convex") {
                    intersection() {
                        translate([
                            0,
                            0,
                            (real_height * block_height) - (curve_circle_height() / 2) - wall_thickness // Align the top of the cube with the top of the block.
                        ])
                            cube([curve_circle_length() / 2, overall_width, curve_circle_height() / 2 + wall_thickness]);

                       translate([0, 0, block_height * real_height])
                            translate([0, overall_width/2, 0]) // Center across the end of the block.
                            rotate([90, 0, 0])
                            translate([0, 0, -overall_width/2]) // z-center
                            difference() {
                                resize([curve_circle_length() + (wall_thickness * 2), curve_circle_height() + (wall_thickness * 2), 0]) // Resize to the final dimensions.
                                cylinder(r=block_height * real_height, h=overall_width, $fs=cylinder_precision);

                                translate([0, 0, -0.5]) // The inner cylinder is just a little taller, for nicer OpenSCAD previews.
                                    resize([curve_circle_length(), curve_circle_height(), 0]) // Resize to the final dimensions.
                                    cylinder(r=block_height * real_height, h=overall_width+1, $fs=cylinder_precision);
                            }
                    }
                }
            }
            
            if (real_dual_sided) {
                translate([overall_length/2, overall_width/2, block_height * height]) mirror([0,0,1]) block(
                    width=real_width,
                    length=real_length,
                    height=real_height,
                    type=type,
                    brand=brand,
                    stud_type=stud_type,
                    horizontal_holes=real_horizontal_holes,
                    vertical_axle_holes=real_vertical_axle_holes,
                    reinforcement=real_reinforcement,
                    wing_type=wing_type,
                    wing_end_width=real_wing_end_width,
                    wing_base_length=real_wing_base_length-1,
                    stud_notches=real_stud_notches,
                    slope_stud_rows=real_slope_stud_rows,
                    slope_end_height=real_slope_end_height,
                    curve_stud_rows=real_curve_stud_rows,
                    curve_type=real_curve_type,
                    curve_end_height=real_curve_end_height,
                    roadway_width=real_roadway_width,
                    roadway_length=real_roadway_length,
                    roadway_x=real_roadway_x,
                    roadway_y=real_roadway_y,
                    stud_rescale=stud_rescale,
                    dual_sided=false
                );
            }

            if (real_dual_bottom) {
                translate([overall_length/2, overall_width/2, block_height * height * 2]) mirror([0,0,1]) block(
                    width=real_width,
                    length=real_length,
                    height=real_height,
                    type="tile",
                    brand=brand,
                    stud_type=stud_type,
                    horizontal_holes=real_horizontal_holes,
                    vertical_axle_holes=real_vertical_axle_holes,
                    reinforcement=real_reinforcement,
                    wing_type=wing_type,
                    wing_end_width=real_wing_end_width,
                    wing_base_length=real_wing_base_length-1,
                    stud_notches=real_stud_notches,
                    slope_stud_rows=real_slope_stud_rows,
                    slope_end_height=real_slope_end_height,
                    curve_stud_rows=real_curve_stud_rows,
                    curve_type=real_curve_type,
                    curve_end_height=real_curve_end_height,
                    roadway_width=real_roadway_width,
                    roadway_length=real_roadway_length,
                    roadway_x=real_roadway_x,
                    roadway_y=real_roadway_y,
                    stud_rescale=stud_rescale,
                    dual_sided=false,
                    dual_bottom=false
                );
            }
    }

    module post(vertical_axle_hole) {
        difference() {
            cylinder(r=post_diameter/2, h=real_height*block_height,$fs=cylinder_precision);
            if (vertical_axle_hole==true) {
                translate([0,0,-block_height/2])
                    axle();
            } else {
                translate([0,0,-0.5]) cylinder(r=(post_diameter/2)-post_wall_thickness, h=real_height*block_height+1,$fs=cylinder_precision);
            }
        }
    }

    module reinforcement() {
        union() {
            translate([0,0,real_height*block_height/2]) union() {
                cube([reinforcing_width, 2 * (stud_spacing - (2 * wall_play)), real_height * block_height],center=true);
                rotate(v=[0,0,1],a=90) cube([reinforcing_width, 2 * (stud_spacing - (2 * wall_play)), real_height * block_height], center=true);
            }
        }
    }

    module axle() {
        translate([0,0,(real_height+1)*block_height/2]) union() {
            cube([axle_diameter,axle_spline_width,(real_height+1)*block_height],center=true);
            cube([axle_spline_width,axle_diameter,(real_height+1)*block_height],center=true);
        }
    }

    module stud() {
        difference() {
            cylinder(r=(stud_diameter*stud_rescale)/2,h=stud_height,$fs=cylinder_precision);

            if (stud_type == "hollow") {
                // 0.5 is for cleaner preview; doesn't affect functionality.
                cylinder(r=(hollow_stud_inner_diameter*stud_rescale)/2,h=stud_height+0.5,$fs=cylinder_precision);
            }
        }
    }

    function curve_circle_length() = (overall_length - (stud_spacing * min(real_length - 1, real_curve_stud_rows)) + (wall_play/2)) * 2;
    function curve_circle_height() = (
            (
                (block_height * real_height) - (real_curve_end_height * block_height)) * 2) - (real_curve_type == "convex" ? (stud_height * 2) + (wall_thickness * 2) : 0);

    function wing_width(x_pos) = (real_width - width_loss(x_pos));

    function width_loss(x_pos) = (type != "wing" ? 0 :
        round((wing_type == "full" ?
            max(0, (2 * wing_slope * (x_pos - (real_wing_base_length - 1)))) + 0.3 // Full wing
            :
            max(0, (wing_slope * (x_pos - (real_wing_base_length - 1)))) + 0.2 // Half wing
        )) // +extra is because full studs can still fit on partially missing bases, but not by much
    );

    function horizontal_hole_start_index() = (
        (
            (type == "slope" && real_slope_stud_rows == 1)
            || (type == "curve" && real_curve_stud_rows == 1)
        )
        ?
        real_length - 1
        :
        0
    );
    function horizontal_hole_end_index() = (
        (
            real_length == 1
            || (type == "slope" && real_slope_stud_rows == 1)
            || (type == "curve" && real_curve_stud_rows == 1)
        )
        ?
        real_length - 1
        :
        real_length - 2
    );
    function skip_this_horizontal_hole(xcount, zcount) = (
        (type == "slope" && ((zcount >= slope_end_height) && (xcount <= real_length - real_slope_stud_rows - 1)))
        ||
        (type == "curve" && ((zcount >= curve_end_height) && (xcount <= real_length - real_curve_stud_rows - 1)))
    );

    function horizontal_holes_x_offset() = (
        (horizontal_hole_diameter / 2)
        + (
            (
                real_length == 1
                || (type == "slope" && real_slope_stud_rows == 1)
                || (type == "curve" && real_curve_stud_rows == 1)
            )
            ?
            0
            :
            (stud_spacing / 2)
        )
    );
    
    function put_stud_here(xcount, ycount) = (
        (type != "wing" && real_roadway_width > 0 && real_roadway_length > 0)
        ||
        (type == "wing" && (
            (wing_type == "full" && (ycount+1 > ceil(width_loss(xcount+1)/2)) && (ycount+1 <= floor(real_width - (width_loss(xcount+1)/2))))
            || (wing_type == "left" && ycount+1 <= wing_width(xcount+1))
            || (wing_type == "right" && ycount >= width_loss(xcount+1))
            )
        )
        ||
        (real_roadway_width == 0 && real_roadway_length == 0)
        ||
        (!pos_in_roadway(xcount, ycount))
    );
    
    function put_vertical_axle_hole_here(xcount, ycount) = (
        !skip_this_axle_hole(xcount, ycount)
    );
    
    function skip_this_vertical_axle_hole(xcount, ycount) = (
        (type == "slope" && xcount < (real_length - real_slope_stud_rows + 1))
        ||
        (type == "curve" && xcount < (real_length - real_curve_stud_rows + 1))
        
    );
    
    function skip_this_stud(xcount, ycount) = (
        (type == "wing" && (
            (wing_type == "full" && ((ycount+1 <= ceil(width_loss(xcount+1)/2)) || (ycount+1 > floor(real_width - (width_loss(xcount+1)/2)))))
            || (wing_type == "left" && ycount+1 > wing_width(xcount+1))
            || (wing_type == "right" && ycount < width_loss(xcount+1))
            )
        )
        ||
        (real_roadway_width > 0 && real_roadway_length > 0 && pos_in_roadway(xcount, ycount))
    );

    function pos_in_roadway(x, y) = (
        x >= real_roadway_x
        && y >= real_roadway_y
        && y < real_roadway_y + real_roadway_width
        && x < real_roadway_x + real_roadway_length
    );
        
    
    module negative_rounded_corner(r,h) {
        difference() {
            translate([0, 0, -.5]) cube([r+1, r+1, h+1]);
            translate([0, 0, -1]) cylinder(r=r, h=h + 2, $fs=cylinder_precision);
        }
    }
}

module uncenter(width, length, height) {
    // stud_spacing = 8
    // wall_play = 0.1
    translate([((8 * length) / 2) - 0.1, ((8 * width) / 2) - 0.1, height ? ((8 * height) / 2) - 0.1 : 0]) children();
}

module place(x, y, z=0) {
    translate([8 * y, 8 * x, z * 9.6]) children();
}
